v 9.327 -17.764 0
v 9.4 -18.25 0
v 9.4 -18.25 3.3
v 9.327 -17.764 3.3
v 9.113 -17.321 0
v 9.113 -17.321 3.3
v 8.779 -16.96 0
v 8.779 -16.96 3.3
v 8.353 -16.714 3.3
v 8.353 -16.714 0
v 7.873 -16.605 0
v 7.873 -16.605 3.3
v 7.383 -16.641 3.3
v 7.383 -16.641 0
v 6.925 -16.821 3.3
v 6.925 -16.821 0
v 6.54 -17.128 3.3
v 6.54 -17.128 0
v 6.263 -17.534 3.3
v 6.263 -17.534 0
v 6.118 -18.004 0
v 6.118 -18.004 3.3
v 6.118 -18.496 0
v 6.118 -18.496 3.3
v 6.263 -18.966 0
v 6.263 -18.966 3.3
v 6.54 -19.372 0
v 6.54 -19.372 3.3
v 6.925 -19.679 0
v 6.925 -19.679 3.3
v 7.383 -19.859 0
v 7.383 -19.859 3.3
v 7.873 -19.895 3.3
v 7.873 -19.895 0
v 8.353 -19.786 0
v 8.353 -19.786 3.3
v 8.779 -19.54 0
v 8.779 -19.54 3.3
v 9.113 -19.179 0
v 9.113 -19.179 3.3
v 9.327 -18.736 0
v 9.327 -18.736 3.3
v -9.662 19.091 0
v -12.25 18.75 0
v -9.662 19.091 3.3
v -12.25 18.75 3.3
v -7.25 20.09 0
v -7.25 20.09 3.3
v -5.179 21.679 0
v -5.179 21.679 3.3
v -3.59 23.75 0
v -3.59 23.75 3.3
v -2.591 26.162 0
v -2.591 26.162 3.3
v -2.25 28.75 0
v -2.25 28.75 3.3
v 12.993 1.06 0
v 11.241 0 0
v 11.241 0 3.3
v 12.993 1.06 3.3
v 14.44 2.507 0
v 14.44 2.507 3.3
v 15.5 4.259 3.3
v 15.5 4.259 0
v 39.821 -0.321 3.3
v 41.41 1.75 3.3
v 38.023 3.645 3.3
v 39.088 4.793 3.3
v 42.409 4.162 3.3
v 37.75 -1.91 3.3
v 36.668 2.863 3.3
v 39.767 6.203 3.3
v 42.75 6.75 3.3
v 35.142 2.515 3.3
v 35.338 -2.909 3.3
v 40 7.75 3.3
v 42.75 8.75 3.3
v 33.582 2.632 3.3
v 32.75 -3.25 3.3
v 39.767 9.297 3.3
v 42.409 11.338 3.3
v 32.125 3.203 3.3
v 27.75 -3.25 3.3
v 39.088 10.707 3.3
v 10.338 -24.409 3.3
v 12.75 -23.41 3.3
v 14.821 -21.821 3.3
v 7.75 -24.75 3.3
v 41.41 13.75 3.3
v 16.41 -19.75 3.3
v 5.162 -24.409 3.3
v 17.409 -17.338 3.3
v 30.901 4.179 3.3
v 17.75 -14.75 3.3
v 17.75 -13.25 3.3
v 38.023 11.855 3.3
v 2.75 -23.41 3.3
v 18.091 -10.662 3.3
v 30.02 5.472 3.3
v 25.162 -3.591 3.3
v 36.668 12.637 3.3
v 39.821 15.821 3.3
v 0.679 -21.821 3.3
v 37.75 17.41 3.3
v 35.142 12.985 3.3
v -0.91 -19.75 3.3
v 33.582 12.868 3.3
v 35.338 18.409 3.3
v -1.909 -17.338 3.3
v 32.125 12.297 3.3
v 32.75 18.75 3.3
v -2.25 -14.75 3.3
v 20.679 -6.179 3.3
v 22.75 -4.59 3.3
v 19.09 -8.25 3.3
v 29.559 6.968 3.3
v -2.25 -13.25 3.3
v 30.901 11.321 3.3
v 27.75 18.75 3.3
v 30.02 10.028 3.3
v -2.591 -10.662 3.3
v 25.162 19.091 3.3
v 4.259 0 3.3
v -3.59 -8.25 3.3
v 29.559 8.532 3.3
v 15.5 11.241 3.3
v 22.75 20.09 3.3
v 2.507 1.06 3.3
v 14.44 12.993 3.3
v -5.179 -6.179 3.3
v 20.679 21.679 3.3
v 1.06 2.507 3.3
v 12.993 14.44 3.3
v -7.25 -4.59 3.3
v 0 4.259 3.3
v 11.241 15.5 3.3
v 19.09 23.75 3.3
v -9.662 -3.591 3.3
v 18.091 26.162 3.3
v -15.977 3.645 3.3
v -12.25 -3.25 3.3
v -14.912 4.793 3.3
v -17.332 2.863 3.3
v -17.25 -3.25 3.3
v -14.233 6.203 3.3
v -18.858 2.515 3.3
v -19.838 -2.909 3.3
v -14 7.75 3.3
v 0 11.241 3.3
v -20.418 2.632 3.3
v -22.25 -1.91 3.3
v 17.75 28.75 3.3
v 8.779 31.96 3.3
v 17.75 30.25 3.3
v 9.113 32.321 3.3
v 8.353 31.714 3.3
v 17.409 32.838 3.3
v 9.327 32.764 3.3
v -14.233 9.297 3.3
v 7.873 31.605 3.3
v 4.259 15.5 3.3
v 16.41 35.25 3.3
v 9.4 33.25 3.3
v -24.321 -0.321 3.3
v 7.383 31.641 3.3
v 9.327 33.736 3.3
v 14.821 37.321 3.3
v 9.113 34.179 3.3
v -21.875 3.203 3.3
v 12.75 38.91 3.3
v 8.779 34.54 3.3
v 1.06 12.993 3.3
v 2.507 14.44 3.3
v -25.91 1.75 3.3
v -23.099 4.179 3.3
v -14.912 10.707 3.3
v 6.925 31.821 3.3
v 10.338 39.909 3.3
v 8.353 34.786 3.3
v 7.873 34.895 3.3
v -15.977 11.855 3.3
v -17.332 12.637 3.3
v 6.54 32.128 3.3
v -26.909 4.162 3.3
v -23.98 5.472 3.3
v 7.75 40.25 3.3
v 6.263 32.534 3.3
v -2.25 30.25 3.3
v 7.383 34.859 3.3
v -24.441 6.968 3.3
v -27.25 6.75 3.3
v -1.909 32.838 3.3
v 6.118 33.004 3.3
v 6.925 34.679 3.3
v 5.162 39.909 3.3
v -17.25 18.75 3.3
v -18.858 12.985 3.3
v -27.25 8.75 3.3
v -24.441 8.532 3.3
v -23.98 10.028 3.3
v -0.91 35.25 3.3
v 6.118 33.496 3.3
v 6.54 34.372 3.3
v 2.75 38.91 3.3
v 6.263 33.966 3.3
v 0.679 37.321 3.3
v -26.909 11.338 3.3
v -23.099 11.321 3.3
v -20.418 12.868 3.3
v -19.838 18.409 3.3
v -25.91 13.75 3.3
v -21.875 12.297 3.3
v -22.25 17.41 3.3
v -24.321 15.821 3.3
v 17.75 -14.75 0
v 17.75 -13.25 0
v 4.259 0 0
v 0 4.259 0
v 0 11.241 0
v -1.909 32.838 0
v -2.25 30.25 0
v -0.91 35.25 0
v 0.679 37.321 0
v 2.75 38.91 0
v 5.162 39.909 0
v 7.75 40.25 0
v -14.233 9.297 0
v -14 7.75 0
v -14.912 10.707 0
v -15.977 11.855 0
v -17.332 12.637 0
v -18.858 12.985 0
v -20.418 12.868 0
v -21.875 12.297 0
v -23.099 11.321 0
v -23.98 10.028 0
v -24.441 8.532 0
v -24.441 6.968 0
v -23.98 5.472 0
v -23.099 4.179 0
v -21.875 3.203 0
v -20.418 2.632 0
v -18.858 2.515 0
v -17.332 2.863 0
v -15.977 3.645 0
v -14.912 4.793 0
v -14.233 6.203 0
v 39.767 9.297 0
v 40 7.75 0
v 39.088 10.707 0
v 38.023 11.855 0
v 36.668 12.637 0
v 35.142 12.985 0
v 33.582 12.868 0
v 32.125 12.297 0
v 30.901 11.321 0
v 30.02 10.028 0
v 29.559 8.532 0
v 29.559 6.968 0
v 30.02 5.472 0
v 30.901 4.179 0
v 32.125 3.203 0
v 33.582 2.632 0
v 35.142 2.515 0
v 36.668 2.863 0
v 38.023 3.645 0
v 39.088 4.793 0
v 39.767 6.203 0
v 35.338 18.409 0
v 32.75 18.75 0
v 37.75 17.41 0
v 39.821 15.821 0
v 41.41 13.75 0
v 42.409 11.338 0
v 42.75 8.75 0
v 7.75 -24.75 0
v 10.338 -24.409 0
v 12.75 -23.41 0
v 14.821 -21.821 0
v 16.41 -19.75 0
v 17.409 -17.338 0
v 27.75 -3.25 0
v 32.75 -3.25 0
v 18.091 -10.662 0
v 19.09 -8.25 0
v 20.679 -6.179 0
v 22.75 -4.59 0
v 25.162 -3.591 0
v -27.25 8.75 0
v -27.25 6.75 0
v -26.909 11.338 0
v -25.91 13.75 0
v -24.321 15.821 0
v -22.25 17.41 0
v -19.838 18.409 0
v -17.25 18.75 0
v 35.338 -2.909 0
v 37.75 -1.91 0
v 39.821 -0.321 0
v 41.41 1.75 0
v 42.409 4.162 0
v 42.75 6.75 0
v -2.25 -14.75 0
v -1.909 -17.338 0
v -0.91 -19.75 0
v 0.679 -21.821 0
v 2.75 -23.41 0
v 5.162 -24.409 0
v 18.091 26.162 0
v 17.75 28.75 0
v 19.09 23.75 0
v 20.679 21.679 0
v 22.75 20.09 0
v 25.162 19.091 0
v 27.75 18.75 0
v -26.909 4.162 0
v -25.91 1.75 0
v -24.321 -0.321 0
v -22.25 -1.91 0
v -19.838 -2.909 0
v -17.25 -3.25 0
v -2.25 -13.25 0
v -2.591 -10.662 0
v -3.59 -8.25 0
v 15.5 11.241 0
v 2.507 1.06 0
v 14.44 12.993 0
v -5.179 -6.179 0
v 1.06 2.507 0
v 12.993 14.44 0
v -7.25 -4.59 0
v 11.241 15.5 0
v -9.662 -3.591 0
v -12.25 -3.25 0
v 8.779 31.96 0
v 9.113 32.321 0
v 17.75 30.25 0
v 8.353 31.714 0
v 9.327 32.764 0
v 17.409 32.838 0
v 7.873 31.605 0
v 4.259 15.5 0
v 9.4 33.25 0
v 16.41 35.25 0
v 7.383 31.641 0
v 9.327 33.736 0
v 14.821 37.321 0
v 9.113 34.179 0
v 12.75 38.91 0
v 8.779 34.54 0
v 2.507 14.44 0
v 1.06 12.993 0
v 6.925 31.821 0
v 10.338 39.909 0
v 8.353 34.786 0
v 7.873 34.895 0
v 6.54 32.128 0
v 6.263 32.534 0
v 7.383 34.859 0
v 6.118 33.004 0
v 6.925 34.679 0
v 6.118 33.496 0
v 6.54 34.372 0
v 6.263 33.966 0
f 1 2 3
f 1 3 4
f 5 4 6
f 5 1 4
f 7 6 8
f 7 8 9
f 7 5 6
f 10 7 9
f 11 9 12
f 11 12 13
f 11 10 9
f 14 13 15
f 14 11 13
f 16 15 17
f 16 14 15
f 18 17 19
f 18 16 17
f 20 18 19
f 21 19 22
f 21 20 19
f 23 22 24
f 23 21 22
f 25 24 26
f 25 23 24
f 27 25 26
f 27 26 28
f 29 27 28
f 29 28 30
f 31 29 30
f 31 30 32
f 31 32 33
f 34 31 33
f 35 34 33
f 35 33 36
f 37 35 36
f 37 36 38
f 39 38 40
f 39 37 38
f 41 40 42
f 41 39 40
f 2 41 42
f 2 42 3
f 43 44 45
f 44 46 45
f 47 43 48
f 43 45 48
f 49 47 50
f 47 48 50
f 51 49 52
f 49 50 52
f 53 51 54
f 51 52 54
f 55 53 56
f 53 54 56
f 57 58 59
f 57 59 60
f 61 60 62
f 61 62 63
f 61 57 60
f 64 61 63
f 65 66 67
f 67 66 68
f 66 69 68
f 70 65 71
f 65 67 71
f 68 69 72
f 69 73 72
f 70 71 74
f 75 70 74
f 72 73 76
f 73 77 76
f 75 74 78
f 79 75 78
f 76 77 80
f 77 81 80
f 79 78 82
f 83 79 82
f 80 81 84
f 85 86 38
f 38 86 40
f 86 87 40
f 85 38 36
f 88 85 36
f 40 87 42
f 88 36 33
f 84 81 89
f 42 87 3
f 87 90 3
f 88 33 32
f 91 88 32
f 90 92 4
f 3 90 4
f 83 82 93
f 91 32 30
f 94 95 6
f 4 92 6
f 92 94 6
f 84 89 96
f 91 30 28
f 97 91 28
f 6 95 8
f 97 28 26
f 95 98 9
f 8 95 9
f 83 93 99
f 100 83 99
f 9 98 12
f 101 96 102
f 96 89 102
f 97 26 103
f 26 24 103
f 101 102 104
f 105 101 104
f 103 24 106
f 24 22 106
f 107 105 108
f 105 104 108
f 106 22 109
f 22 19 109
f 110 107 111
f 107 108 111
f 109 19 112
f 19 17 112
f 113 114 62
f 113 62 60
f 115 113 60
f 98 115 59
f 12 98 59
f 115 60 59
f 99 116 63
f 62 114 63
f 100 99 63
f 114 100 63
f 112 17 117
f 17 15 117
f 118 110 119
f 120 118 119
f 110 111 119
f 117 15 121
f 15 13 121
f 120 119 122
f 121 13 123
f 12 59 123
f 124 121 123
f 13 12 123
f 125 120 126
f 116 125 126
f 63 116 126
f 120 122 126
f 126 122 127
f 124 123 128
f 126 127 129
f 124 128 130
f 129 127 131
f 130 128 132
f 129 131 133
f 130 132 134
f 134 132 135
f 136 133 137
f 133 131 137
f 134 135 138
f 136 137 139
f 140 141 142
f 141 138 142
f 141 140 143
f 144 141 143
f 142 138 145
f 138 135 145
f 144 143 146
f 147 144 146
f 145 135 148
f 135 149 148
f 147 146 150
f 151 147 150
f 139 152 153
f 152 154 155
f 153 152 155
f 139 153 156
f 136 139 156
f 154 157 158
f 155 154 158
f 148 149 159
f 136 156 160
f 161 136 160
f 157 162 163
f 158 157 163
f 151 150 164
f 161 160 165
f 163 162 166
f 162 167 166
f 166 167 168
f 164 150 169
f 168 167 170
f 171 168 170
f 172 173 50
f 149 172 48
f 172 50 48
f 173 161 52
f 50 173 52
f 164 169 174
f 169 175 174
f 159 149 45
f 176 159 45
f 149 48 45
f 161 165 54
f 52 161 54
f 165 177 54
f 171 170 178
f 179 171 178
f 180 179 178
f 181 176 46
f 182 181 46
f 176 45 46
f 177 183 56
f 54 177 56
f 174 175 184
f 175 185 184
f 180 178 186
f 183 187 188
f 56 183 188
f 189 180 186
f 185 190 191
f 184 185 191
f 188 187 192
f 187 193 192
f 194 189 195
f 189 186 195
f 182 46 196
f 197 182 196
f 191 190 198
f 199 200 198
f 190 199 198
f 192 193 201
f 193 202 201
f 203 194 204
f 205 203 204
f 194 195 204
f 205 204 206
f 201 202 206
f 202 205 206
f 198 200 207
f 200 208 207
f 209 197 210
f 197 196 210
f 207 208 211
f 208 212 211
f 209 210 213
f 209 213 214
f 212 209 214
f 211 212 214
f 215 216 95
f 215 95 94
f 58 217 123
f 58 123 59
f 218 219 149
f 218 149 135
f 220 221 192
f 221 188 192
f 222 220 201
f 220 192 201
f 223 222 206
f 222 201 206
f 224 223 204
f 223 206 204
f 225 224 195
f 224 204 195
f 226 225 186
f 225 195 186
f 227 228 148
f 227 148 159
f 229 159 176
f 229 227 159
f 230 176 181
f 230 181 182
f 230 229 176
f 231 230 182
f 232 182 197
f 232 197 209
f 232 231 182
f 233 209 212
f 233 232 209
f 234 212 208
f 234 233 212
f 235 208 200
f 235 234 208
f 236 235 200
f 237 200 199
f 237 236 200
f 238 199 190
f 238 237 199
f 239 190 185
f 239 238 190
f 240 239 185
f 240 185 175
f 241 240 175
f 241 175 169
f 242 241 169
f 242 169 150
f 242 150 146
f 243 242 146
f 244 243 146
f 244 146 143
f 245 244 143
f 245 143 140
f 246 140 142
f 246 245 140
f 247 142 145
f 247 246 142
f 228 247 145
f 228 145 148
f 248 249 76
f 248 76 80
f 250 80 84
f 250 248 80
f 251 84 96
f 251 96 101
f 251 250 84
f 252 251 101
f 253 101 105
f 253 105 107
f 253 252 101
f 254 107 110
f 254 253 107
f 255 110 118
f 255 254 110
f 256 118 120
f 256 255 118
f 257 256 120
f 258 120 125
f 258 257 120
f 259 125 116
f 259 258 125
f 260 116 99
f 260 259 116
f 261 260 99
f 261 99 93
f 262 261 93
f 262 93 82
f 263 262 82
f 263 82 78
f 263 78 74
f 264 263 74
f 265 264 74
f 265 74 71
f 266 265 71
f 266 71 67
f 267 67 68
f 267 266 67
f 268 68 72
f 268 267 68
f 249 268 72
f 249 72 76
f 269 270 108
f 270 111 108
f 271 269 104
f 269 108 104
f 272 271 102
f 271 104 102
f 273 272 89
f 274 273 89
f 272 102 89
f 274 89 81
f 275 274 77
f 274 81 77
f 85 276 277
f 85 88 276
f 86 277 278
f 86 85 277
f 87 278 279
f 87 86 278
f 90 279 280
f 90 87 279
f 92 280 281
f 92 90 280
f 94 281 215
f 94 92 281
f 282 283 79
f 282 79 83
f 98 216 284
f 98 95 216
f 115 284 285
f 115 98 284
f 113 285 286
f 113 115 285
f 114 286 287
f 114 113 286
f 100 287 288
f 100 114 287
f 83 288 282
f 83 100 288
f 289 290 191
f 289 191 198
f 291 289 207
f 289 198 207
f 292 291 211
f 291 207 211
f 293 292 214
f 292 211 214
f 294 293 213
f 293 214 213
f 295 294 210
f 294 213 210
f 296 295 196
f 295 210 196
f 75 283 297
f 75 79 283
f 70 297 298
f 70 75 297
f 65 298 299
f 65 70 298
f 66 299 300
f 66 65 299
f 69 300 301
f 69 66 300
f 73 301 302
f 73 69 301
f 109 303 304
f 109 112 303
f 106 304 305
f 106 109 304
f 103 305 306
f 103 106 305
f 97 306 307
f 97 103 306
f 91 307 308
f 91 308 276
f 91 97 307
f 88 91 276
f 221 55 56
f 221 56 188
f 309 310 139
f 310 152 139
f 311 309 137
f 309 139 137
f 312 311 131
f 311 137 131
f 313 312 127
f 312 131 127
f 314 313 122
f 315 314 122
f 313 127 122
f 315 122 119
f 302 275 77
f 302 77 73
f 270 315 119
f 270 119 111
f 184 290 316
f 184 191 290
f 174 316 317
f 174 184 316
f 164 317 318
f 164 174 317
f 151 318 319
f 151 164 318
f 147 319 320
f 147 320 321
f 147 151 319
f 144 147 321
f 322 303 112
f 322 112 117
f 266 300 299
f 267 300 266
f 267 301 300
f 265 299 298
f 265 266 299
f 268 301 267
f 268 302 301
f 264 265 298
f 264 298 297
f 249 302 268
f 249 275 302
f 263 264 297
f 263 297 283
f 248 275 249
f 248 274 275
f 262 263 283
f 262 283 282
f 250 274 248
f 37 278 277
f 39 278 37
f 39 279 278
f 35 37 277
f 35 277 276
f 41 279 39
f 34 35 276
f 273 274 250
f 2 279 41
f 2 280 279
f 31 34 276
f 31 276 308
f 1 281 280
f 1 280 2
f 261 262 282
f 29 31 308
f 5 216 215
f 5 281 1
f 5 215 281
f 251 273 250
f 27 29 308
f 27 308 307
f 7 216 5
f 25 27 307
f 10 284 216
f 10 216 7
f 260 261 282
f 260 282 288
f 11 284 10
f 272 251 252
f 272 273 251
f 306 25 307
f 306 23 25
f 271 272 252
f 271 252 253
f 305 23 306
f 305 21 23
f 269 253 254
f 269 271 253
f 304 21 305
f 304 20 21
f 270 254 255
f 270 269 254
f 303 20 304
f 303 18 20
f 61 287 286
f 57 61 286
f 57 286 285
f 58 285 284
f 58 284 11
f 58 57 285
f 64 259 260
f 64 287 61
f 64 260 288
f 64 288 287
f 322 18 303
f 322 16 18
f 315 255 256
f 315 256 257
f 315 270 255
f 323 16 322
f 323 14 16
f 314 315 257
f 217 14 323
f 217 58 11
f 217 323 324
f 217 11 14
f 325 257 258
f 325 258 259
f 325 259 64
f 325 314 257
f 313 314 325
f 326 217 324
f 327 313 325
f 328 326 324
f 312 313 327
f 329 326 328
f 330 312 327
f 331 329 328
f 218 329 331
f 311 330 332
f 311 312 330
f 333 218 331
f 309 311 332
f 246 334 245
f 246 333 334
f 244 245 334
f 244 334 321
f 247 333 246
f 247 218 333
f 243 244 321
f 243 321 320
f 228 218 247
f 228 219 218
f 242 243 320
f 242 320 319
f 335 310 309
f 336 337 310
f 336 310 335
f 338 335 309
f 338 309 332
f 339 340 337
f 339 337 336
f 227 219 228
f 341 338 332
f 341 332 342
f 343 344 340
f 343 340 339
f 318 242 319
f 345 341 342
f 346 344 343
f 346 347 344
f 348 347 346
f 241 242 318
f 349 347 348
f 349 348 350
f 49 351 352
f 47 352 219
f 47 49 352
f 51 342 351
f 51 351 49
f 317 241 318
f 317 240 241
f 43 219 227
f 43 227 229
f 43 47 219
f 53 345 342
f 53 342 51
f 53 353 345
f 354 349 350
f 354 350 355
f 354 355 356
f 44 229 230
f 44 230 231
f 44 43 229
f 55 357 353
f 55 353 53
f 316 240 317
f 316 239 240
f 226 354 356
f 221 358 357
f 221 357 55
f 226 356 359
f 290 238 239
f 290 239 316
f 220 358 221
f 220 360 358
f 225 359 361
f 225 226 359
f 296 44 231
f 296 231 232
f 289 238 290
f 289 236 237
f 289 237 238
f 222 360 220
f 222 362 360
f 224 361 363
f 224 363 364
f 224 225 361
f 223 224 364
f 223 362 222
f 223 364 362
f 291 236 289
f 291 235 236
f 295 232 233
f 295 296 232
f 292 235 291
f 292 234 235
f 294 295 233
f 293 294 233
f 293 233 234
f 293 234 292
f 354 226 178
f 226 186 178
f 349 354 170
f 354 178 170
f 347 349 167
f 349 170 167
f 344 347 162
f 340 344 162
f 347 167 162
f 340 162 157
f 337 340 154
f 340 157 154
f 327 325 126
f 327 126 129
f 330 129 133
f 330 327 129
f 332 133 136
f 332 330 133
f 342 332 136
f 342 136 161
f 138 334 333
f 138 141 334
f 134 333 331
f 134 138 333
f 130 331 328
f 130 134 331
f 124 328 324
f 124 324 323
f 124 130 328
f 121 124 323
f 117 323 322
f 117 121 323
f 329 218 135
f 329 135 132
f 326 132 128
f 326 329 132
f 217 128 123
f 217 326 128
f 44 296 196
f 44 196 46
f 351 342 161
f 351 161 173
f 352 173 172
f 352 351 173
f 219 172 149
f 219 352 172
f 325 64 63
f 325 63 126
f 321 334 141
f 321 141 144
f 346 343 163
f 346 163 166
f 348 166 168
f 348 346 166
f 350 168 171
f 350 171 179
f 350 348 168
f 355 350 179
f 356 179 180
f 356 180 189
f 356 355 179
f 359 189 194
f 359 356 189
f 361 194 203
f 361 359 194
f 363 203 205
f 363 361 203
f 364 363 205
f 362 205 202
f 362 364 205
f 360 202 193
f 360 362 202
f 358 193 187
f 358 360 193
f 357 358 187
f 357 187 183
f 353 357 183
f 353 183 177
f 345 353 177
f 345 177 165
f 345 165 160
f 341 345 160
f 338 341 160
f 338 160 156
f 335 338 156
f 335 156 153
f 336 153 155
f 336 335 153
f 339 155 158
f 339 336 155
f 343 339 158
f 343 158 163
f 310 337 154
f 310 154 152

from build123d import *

# Parameters (mm, degrees)
SKETCH_1_R      = 5.25
SKETCH_1_R_2    = 1.65
EXTRUDE_1_DEPTH = 3.3
FILLET_1_R      = 10


with BuildPart() as part:
    # 草图1 → 凸台-拉伸1 (new body)
    with BuildSketch(Plane.XY):
        Polygon((-27.25, -3.25), (-27.25, 18.75), (-2.25, 18.75), (-2.25, 40.25), (17.75, 40.25), (17.75, 18.75), (42.75, 18.75), (42.75, -3.25), (17.75, -3.25), (17.75, -24.75), (-2.25, -24.75), (-2.25, -3.25), align=None)
        with Locations((34.75, 7.75)):
            Circle(SKETCH_1_R, mode=Mode.SUBTRACT)
        with Locations((-19.25, 7.75)):
            Circle(SKETCH_1_R, mode=Mode.SUBTRACT)
        with Locations((7.75, 33.25)):
            Circle(SKETCH_1_R_2, mode=Mode.SUBTRACT)
        with Locations((7.75, -18.25)):
            Circle(SKETCH_1_R_2, mode=Mode.SUBTRACT)
        with BuildLine():
            Line((4.258939989, 0), (11.241060011, 0))
            ThreePointArc((11.241060011, 0), (13.76040764, 1.73959236), (15.5, 4.258939989))
            Line((15.5, 4.258939989), (15.5, 11.241060011))
            ThreePointArc((15.5, 11.241060011), (13.76040764, 13.76040764), (11.241060011, 15.5))
            Line((11.241060011, 15.5), (4.258939989, 15.5))
            ThreePointArc((4.258939989, 15.5), (1.73959236, 13.76040764), (0, 11.241060011))
            Line((0, 11.241060011), (0, 4.258939989))
            ThreePointArc((0, 4.258939989), (1.73959236, 1.73959236), (4.258939989, 0))
        make_face(mode=Mode.SUBTRACT)
    extrude(amount=EXTRUDE_1_DEPTH)

    # 圆角1
    fillet_1_edges = [part.edges().sort_by_distance(p)[0] for p in [
        (-27.25, 18.75, 1.65),
        (-27.25, -3.25, 1.65),
        (-2.25, -3.25, 1.65),
        (-2.25, -24.75, 1.65),
        (17.75, -24.75, 1.65),
        (17.75, -3.25, 1.65),
        (42.75, -3.25, 1.65),
        (42.75, 18.75, 1.65),
        (17.75, 18.75, 1.65),
        (-2.25, 18.75, 1.65),
        (-2.25, 40.25, 1.65),
        (17.75, 40.25, 1.65),
    ]]
    fillet(fillet_1_edges, radius=FILLET_1_R - 0.0001)  # a hair under: the kernel refuses the full size


solid = part.part
